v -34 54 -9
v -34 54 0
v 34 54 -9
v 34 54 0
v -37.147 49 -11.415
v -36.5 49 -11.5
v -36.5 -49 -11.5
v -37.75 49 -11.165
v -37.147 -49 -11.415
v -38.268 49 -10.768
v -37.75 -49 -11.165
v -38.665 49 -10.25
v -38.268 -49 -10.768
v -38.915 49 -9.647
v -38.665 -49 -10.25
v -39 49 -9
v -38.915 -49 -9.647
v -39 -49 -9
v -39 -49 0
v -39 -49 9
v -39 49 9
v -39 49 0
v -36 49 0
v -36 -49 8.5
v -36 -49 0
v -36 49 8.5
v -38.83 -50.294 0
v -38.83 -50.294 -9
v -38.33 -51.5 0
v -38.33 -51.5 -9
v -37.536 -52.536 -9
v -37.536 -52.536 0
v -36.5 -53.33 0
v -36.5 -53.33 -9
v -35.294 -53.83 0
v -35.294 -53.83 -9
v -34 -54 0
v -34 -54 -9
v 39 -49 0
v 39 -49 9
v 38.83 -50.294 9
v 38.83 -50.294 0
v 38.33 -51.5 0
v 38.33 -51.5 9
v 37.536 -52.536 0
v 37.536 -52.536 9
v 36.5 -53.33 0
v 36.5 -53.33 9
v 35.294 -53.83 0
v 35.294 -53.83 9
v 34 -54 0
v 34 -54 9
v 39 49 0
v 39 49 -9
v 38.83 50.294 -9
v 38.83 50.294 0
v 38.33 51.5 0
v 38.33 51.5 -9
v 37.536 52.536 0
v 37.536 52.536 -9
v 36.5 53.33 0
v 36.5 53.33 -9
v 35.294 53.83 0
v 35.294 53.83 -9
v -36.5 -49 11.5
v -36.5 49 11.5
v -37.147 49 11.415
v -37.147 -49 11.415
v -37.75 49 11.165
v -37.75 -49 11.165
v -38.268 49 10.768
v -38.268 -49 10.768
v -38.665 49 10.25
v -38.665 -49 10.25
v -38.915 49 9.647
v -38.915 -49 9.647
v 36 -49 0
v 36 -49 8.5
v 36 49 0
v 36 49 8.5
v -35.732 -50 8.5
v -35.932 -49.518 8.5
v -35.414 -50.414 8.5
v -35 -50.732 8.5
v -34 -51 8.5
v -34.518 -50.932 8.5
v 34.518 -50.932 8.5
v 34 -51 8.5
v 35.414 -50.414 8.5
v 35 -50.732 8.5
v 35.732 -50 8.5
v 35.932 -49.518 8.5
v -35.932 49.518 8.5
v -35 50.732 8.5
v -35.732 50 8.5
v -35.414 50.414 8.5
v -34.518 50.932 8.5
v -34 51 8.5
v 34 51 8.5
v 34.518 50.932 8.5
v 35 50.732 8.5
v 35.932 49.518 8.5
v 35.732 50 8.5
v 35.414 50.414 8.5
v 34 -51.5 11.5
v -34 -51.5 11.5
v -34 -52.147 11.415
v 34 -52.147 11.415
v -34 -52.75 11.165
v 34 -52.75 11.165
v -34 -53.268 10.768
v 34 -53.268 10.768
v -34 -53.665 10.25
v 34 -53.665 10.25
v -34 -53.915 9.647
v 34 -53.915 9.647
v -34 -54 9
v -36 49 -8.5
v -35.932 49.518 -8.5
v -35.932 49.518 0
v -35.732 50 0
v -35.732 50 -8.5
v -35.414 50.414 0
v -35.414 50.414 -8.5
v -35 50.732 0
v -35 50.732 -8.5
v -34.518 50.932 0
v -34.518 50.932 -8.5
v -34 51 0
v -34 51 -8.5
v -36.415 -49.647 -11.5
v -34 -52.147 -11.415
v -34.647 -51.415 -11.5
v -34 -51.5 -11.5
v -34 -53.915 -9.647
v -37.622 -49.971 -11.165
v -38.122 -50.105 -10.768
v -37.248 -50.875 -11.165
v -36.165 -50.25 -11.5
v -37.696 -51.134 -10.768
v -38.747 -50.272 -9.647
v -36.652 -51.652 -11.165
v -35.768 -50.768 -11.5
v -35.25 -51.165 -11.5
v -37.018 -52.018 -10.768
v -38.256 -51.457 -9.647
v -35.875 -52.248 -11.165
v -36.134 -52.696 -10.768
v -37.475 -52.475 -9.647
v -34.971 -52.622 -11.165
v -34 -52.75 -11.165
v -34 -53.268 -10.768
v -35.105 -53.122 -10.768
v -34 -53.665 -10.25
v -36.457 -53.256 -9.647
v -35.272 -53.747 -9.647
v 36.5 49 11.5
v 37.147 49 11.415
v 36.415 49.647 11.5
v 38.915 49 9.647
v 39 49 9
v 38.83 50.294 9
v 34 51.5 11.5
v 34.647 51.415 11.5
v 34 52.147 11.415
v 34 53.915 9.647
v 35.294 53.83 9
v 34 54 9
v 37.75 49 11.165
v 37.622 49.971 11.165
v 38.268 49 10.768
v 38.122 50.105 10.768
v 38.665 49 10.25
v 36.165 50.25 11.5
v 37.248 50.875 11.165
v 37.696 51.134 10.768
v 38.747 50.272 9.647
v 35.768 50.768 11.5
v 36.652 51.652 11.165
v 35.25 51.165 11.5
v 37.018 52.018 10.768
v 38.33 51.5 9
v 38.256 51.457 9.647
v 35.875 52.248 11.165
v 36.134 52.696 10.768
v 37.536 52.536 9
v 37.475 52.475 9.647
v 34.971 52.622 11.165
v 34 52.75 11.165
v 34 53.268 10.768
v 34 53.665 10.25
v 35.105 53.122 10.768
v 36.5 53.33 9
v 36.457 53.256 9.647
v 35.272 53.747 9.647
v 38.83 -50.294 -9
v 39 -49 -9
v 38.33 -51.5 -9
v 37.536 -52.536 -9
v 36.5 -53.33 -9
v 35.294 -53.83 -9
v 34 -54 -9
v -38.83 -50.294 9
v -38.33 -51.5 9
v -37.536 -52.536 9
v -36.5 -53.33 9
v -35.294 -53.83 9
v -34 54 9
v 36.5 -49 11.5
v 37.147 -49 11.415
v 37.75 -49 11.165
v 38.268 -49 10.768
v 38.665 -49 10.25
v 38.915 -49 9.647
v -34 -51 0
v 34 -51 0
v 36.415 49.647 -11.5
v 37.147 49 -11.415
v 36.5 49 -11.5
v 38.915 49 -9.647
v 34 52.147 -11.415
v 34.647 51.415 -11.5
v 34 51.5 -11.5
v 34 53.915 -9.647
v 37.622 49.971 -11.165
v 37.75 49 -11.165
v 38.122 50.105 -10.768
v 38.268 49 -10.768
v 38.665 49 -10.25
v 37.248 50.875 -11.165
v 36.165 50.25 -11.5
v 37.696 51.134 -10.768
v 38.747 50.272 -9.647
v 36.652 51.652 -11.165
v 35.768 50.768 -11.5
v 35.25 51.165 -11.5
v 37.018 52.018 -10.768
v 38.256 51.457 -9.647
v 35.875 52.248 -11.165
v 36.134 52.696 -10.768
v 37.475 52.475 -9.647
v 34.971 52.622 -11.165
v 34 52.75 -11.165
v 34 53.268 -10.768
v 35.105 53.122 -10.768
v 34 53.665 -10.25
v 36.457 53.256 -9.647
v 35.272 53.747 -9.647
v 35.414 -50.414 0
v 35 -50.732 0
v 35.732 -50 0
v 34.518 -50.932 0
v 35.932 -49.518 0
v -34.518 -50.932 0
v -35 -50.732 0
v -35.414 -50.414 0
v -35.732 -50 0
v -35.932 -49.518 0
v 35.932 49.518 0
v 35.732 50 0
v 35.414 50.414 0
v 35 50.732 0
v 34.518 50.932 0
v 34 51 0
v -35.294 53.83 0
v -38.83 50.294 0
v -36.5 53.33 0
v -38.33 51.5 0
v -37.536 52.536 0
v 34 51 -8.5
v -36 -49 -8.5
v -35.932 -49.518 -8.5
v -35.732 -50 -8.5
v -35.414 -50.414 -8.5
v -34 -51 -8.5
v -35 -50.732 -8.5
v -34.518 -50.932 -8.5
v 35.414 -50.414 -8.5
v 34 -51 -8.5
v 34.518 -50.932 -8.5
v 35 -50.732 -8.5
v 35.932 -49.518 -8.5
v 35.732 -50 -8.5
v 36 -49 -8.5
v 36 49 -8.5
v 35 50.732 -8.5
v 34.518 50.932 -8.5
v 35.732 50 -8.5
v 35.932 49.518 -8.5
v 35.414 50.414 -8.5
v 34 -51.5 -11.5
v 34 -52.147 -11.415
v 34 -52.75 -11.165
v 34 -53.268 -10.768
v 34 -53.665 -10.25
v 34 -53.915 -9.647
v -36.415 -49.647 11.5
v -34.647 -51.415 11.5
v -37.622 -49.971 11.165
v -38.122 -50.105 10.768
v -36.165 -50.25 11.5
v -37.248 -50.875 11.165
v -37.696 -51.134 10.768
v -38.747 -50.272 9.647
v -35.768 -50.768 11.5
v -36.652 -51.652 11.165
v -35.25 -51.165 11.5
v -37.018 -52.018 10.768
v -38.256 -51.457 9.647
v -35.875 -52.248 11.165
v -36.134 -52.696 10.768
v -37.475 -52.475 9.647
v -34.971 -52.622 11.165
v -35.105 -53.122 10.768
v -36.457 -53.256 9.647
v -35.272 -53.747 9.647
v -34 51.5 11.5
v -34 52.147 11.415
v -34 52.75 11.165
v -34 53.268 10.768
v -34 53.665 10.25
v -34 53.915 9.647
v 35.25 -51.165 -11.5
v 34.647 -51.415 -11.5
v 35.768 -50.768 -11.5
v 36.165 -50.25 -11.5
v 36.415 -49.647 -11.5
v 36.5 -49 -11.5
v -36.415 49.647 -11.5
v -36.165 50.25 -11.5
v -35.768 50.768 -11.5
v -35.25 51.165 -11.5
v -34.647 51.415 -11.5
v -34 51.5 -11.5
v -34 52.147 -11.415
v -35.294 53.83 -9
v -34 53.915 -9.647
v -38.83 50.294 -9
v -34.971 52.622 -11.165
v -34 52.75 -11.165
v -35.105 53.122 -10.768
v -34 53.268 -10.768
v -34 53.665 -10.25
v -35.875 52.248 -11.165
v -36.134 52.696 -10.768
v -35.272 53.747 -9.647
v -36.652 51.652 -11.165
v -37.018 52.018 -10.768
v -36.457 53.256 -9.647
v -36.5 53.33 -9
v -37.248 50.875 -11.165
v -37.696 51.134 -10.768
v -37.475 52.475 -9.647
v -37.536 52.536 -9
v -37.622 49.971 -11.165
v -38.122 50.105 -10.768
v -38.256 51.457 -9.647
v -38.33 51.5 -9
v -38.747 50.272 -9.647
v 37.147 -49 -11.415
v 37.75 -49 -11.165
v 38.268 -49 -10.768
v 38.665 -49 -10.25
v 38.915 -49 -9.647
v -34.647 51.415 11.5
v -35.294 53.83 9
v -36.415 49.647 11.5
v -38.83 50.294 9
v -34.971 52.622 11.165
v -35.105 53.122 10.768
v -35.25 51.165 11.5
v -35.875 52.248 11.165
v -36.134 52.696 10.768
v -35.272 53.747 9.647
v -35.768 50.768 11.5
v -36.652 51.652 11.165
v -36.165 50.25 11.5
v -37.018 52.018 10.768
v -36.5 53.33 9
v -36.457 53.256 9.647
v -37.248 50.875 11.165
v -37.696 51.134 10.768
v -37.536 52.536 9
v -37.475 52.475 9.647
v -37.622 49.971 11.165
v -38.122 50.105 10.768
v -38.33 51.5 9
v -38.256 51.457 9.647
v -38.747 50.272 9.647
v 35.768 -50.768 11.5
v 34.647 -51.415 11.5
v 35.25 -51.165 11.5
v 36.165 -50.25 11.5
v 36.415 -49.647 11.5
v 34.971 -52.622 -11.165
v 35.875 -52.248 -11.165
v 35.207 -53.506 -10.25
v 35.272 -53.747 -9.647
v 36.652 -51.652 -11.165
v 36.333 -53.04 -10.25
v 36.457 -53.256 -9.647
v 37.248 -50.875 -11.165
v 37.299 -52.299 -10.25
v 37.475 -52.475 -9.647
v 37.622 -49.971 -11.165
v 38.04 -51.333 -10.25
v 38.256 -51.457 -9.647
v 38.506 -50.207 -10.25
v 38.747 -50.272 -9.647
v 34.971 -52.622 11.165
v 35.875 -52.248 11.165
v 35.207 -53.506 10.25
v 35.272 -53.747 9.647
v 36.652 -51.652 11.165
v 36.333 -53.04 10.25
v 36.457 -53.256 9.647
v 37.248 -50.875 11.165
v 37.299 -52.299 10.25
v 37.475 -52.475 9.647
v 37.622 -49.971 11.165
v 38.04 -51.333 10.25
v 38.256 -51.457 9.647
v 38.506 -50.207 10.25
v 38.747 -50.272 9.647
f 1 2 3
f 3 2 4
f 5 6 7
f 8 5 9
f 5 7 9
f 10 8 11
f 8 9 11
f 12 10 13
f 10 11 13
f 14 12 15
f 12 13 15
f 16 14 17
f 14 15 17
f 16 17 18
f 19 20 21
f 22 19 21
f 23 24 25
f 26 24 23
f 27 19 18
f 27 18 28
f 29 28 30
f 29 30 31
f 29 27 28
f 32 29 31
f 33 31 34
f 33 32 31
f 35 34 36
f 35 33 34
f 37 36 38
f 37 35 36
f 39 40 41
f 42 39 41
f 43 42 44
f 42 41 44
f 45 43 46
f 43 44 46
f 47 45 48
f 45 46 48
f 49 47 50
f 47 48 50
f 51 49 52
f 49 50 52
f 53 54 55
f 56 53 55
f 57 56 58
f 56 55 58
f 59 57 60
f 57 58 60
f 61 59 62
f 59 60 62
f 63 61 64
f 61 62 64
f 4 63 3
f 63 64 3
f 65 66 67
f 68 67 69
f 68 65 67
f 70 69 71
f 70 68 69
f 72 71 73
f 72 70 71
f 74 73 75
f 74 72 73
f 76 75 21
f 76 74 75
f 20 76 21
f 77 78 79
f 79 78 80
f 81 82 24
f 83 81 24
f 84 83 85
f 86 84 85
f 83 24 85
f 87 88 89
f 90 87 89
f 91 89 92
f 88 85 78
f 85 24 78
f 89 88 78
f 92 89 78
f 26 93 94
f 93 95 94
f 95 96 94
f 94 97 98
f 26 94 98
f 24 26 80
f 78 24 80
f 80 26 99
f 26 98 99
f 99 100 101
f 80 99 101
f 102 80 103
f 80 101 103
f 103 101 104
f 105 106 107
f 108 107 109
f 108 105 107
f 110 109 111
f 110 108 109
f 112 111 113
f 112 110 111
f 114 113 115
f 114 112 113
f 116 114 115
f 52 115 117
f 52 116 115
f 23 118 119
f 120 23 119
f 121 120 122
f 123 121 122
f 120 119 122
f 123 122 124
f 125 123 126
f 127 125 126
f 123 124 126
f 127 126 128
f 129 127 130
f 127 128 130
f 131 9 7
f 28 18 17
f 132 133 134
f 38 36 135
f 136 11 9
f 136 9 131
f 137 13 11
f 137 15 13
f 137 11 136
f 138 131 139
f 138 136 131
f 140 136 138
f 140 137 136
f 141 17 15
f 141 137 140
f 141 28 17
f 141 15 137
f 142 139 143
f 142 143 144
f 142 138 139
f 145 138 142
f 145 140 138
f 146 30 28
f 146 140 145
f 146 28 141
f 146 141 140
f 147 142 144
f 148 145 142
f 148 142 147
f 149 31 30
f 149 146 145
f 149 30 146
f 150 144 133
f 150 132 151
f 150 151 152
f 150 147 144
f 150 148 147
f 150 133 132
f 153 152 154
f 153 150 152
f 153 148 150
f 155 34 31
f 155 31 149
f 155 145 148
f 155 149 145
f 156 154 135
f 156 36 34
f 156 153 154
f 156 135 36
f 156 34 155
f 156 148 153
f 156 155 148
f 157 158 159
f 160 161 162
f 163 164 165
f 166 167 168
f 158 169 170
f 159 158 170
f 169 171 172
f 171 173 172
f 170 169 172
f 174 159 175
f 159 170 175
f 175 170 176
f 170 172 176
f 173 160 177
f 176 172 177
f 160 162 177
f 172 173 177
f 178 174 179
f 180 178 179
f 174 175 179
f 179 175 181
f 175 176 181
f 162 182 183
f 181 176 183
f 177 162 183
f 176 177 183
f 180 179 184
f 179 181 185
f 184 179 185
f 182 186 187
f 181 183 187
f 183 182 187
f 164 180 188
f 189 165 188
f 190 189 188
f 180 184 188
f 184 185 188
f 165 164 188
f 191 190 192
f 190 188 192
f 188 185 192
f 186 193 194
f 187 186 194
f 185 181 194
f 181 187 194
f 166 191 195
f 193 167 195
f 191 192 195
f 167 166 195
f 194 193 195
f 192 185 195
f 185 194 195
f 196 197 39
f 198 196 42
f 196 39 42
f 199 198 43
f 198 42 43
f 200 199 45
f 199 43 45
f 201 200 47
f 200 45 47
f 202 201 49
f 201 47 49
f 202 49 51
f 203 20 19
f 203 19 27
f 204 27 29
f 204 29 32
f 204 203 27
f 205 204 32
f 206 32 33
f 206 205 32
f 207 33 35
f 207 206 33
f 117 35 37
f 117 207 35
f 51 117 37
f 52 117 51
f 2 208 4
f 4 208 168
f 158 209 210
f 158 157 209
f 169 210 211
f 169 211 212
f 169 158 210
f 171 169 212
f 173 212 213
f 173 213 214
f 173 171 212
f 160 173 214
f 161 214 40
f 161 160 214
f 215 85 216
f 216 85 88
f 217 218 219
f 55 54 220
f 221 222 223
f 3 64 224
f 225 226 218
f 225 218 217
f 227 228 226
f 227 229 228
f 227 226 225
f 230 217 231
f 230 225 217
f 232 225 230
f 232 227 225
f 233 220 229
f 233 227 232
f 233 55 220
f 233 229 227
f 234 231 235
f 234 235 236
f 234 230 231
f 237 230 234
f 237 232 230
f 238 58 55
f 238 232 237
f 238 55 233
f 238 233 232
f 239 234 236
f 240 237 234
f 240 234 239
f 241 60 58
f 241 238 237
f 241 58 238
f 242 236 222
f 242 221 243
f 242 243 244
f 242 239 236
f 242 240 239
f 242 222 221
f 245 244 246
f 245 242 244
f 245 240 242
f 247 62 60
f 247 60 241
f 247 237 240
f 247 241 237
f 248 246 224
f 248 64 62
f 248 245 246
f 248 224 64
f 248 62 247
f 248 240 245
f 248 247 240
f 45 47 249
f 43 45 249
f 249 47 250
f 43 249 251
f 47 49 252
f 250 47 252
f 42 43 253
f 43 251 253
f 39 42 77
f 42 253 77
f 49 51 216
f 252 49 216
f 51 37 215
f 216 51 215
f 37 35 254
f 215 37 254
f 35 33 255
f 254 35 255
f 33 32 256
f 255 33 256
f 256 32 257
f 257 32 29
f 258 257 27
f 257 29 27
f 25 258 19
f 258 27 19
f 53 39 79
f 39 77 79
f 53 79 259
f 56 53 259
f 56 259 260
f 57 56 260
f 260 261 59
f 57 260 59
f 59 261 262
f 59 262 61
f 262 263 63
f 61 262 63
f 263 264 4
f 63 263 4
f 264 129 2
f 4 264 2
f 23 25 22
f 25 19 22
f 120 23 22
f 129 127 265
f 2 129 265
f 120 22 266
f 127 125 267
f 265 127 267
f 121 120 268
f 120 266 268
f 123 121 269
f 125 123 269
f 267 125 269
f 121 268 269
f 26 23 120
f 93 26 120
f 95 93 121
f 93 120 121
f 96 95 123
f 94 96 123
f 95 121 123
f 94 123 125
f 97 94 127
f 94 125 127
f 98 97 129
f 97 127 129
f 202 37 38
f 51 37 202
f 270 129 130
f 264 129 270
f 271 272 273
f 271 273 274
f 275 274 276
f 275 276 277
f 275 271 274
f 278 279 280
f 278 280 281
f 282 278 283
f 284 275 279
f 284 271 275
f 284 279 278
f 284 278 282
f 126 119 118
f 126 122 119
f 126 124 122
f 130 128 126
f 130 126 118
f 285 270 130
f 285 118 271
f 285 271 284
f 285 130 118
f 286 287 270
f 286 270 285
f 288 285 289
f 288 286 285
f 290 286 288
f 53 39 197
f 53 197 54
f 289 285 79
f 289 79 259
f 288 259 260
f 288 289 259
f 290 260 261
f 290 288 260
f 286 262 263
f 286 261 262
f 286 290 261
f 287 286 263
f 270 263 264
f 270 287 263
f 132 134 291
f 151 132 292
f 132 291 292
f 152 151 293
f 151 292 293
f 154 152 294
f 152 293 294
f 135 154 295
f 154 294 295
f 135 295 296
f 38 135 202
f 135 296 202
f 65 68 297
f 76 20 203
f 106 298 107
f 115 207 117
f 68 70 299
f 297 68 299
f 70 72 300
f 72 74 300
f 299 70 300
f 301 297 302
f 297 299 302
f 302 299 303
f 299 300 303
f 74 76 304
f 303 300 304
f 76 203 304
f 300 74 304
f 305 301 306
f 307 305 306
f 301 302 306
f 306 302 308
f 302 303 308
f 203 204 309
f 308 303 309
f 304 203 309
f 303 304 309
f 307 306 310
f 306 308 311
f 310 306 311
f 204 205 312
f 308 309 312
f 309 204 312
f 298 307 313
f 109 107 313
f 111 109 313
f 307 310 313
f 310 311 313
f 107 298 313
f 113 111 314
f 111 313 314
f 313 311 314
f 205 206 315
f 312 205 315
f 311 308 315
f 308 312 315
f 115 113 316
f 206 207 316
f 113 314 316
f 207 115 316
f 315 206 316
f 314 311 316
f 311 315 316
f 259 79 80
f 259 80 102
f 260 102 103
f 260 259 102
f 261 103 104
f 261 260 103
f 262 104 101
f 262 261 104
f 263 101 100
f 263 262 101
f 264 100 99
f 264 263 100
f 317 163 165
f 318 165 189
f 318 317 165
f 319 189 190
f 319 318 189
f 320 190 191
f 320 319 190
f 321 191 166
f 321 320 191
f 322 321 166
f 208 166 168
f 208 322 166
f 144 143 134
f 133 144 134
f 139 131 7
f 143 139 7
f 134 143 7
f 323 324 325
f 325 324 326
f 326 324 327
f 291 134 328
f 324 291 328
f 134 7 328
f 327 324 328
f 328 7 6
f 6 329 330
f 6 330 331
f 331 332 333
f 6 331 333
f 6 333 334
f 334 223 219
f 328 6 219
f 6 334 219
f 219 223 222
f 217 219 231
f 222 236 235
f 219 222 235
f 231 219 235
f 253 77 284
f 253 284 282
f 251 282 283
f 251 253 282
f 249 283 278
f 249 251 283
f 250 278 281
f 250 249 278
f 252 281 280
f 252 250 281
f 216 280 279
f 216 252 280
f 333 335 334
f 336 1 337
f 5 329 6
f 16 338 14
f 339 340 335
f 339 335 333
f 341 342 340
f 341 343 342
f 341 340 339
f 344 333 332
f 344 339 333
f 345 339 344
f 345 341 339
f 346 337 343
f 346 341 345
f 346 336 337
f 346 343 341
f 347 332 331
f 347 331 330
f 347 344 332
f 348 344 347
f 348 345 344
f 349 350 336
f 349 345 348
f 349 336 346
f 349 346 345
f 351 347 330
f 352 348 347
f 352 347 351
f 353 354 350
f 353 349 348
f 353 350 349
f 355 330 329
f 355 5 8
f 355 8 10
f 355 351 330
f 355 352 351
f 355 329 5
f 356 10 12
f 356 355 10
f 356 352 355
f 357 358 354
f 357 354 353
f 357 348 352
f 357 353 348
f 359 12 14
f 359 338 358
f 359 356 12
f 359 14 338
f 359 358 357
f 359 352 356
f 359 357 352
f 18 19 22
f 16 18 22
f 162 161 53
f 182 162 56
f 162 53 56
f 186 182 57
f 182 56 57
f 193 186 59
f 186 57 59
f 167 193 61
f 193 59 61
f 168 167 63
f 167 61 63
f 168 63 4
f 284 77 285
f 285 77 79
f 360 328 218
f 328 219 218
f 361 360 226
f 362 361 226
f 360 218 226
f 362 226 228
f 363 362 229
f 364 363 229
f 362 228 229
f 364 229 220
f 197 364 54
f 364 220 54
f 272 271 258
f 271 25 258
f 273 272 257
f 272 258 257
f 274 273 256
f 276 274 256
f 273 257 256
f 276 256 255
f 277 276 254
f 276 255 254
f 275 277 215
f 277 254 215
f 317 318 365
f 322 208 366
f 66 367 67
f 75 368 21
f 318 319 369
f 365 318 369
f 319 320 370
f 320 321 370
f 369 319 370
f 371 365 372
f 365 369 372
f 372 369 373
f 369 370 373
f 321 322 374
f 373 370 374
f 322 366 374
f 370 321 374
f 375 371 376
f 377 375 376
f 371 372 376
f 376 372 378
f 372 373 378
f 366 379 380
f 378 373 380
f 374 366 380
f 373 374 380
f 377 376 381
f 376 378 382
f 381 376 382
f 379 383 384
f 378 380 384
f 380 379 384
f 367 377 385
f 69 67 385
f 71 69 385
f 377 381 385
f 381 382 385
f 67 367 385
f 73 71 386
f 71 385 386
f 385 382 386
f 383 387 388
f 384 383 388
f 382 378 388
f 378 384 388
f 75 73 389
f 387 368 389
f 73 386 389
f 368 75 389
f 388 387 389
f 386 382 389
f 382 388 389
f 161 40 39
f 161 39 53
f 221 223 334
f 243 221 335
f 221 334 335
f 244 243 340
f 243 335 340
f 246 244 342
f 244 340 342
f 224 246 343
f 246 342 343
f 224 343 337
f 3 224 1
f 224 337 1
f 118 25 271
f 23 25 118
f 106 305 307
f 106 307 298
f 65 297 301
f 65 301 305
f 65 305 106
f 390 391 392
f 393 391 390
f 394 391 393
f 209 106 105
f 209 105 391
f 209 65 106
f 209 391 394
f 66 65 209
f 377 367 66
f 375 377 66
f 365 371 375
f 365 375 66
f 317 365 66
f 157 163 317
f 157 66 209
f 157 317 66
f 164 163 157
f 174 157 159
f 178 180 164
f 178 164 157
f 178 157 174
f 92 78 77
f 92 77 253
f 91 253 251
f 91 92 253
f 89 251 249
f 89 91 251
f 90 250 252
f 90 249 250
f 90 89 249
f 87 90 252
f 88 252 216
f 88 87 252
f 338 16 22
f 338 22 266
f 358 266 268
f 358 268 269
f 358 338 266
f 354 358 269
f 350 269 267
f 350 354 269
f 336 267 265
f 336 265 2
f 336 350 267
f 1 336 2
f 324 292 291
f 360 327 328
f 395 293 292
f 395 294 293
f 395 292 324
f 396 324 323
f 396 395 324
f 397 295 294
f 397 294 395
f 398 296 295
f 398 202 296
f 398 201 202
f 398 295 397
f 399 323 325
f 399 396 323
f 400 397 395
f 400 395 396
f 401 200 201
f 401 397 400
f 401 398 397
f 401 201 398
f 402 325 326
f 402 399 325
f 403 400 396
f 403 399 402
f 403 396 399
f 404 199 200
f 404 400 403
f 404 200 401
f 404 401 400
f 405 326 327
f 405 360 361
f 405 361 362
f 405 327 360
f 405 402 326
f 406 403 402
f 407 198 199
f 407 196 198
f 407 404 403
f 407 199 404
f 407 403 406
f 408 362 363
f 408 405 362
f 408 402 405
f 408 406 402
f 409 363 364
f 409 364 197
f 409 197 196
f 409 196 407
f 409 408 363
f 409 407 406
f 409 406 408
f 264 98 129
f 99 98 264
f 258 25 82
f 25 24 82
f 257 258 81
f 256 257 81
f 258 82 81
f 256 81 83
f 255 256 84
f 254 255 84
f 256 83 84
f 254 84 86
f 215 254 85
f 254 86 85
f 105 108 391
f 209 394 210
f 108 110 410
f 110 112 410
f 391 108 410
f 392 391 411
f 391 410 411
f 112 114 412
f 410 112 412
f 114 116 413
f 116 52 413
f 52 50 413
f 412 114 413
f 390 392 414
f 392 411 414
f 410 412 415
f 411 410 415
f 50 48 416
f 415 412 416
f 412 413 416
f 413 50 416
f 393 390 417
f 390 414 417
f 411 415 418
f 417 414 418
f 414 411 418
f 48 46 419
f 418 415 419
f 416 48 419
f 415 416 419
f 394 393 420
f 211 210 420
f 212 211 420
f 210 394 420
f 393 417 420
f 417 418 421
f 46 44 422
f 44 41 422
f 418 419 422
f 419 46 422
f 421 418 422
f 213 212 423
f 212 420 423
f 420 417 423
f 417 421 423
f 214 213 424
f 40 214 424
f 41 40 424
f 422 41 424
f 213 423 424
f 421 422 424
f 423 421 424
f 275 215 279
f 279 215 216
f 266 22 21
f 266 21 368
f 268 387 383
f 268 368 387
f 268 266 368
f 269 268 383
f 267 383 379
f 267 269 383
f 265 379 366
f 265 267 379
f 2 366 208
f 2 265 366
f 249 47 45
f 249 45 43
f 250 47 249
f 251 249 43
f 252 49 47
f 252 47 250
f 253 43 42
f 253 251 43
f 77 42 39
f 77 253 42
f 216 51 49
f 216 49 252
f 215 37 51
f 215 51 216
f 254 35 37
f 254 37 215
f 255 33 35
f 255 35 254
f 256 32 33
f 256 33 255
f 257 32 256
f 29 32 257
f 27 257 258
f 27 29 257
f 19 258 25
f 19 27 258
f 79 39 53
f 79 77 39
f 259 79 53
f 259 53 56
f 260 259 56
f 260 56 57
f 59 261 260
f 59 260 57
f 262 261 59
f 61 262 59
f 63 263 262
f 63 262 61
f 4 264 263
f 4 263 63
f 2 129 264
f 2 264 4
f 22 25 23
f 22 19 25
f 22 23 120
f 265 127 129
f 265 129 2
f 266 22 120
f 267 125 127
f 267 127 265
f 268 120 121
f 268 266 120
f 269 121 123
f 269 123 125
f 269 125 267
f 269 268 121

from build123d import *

# Parameters (mm, degrees)
SKETCH1_W              = 78
SKETCH1_H              = 108
MAIN_SHAPE_DEPTH       = 11.5
FILLET1_R              = 5
FILLET2_R              = 2.5
SHELL1_T               = 3
SPLIT1_SURFACE_1_BACK  = 136.192
SPLIT1_SURFACE_1_DEPTH = 272.384
SPLIT1_SURFACE_2_BACK  = 136.192
SPLIT1_SURFACE_2_DEPTH = 272.384


with BuildPart() as part:
    # Sketch1 → Main Shape (new, symmetric)
    with BuildSketch(Plane.XY):
        Rectangle(SKETCH1_W, SKETCH1_H)
    extrude(amount=MAIN_SHAPE_DEPTH, both=True)

    # Fillet1
    fillet1_edges = [part.edges().sort_by_distance(p)[0] for p in [
        (39, -54, 0),
        (-39, -54, 0),
        (-39, 54, 0),
        (39, 54, 0),
    ]]
    fillet(fillet1_edges, radius=FILLET1_R)

    # Fillet2
    fillet2_edges = [part.edges().sort_by_distance(p)[0] for p in [
        (39, 0, -11.5),
        (39, 0, 11.5),
        (0, -54, -11.5),
        (-39, 0, -11.5),
        (0, 54, -11.5),
        (37.535533906, 52.535533906, -11.5),
        (-37.535533906, 52.535533906, -11.5),
        (-37.535533906, -52.535533906, -11.5),
        (37.535533906, -52.535533906, -11.5),
        (0, -54, 11.5),
        (0, 54, 11.5),
        (-39, 0, 11.5),
        (37.535533906, 52.535533906, 11.5),
        (-37.535533906, 52.535533906, 11.5),
        (-37.535533906, -52.535533906, 11.5),
        (37.535533906, -52.535533906, 11.5),
    ]]
    fillet(fillet2_edges, radius=FILLET2_R)

    # Shell1 (no face opened: a closed hollow body)
    add(offset(amount=-SHELL1_T, mode=Mode.PRIVATE), mode=Mode.SUBTRACT)


with BuildPart() as body_2:
    # Split1: the piece behind the surface
    add(part.part)
    # Split1 surface: a surface, the sketch's curves swept straight by 272.384 mm
    with BuildLine(Plane(origin=(0, 0, 0), x_dir=(0, 0, -1), z_dir=(1, 0, 0)).offset(-SPLIT1_SURFACE_1_BACK), mode=Mode.PRIVATE) as split1_surface_1_path:
        Line((0, -65), (0, 65))
    split1_surface_1 = Shell.extrude(split1_surface_1_path.wire(), (1 * SPLIT1_SURFACE_1_DEPTH, 0 * SPLIT1_SURFACE_1_DEPTH, 0 * SPLIT1_SURFACE_1_DEPTH))
    split(bisect_by=split1_surface_1, keep=Keep.BOTTOM)


with BuildPart() as part_1:
    add(part.part)

    # Split1: split by a surface, the side it looks to stays
    # Split1 surface: a surface, the sketch's curves swept straight by 272.384 mm
    with BuildLine(Plane(origin=(0, 0, 0), x_dir=(0, 0, -1), z_dir=(1, 0, 0)).offset(-SPLIT1_SURFACE_2_BACK), mode=Mode.PRIVATE) as split1_surface_2_path:
        Line((0, -65), (0, 65))
    split1_surface_2 = Shell.extrude(split1_surface_2_path.wire(), (1 * SPLIT1_SURFACE_2_DEPTH, 0 * SPLIT1_SURFACE_2_DEPTH, 0 * SPLIT1_SURFACE_2_DEPTH))
    split(bisect_by=split1_surface_2, keep=Keep.TOP)


solid = Compound([body_2.part, part_1.part])
